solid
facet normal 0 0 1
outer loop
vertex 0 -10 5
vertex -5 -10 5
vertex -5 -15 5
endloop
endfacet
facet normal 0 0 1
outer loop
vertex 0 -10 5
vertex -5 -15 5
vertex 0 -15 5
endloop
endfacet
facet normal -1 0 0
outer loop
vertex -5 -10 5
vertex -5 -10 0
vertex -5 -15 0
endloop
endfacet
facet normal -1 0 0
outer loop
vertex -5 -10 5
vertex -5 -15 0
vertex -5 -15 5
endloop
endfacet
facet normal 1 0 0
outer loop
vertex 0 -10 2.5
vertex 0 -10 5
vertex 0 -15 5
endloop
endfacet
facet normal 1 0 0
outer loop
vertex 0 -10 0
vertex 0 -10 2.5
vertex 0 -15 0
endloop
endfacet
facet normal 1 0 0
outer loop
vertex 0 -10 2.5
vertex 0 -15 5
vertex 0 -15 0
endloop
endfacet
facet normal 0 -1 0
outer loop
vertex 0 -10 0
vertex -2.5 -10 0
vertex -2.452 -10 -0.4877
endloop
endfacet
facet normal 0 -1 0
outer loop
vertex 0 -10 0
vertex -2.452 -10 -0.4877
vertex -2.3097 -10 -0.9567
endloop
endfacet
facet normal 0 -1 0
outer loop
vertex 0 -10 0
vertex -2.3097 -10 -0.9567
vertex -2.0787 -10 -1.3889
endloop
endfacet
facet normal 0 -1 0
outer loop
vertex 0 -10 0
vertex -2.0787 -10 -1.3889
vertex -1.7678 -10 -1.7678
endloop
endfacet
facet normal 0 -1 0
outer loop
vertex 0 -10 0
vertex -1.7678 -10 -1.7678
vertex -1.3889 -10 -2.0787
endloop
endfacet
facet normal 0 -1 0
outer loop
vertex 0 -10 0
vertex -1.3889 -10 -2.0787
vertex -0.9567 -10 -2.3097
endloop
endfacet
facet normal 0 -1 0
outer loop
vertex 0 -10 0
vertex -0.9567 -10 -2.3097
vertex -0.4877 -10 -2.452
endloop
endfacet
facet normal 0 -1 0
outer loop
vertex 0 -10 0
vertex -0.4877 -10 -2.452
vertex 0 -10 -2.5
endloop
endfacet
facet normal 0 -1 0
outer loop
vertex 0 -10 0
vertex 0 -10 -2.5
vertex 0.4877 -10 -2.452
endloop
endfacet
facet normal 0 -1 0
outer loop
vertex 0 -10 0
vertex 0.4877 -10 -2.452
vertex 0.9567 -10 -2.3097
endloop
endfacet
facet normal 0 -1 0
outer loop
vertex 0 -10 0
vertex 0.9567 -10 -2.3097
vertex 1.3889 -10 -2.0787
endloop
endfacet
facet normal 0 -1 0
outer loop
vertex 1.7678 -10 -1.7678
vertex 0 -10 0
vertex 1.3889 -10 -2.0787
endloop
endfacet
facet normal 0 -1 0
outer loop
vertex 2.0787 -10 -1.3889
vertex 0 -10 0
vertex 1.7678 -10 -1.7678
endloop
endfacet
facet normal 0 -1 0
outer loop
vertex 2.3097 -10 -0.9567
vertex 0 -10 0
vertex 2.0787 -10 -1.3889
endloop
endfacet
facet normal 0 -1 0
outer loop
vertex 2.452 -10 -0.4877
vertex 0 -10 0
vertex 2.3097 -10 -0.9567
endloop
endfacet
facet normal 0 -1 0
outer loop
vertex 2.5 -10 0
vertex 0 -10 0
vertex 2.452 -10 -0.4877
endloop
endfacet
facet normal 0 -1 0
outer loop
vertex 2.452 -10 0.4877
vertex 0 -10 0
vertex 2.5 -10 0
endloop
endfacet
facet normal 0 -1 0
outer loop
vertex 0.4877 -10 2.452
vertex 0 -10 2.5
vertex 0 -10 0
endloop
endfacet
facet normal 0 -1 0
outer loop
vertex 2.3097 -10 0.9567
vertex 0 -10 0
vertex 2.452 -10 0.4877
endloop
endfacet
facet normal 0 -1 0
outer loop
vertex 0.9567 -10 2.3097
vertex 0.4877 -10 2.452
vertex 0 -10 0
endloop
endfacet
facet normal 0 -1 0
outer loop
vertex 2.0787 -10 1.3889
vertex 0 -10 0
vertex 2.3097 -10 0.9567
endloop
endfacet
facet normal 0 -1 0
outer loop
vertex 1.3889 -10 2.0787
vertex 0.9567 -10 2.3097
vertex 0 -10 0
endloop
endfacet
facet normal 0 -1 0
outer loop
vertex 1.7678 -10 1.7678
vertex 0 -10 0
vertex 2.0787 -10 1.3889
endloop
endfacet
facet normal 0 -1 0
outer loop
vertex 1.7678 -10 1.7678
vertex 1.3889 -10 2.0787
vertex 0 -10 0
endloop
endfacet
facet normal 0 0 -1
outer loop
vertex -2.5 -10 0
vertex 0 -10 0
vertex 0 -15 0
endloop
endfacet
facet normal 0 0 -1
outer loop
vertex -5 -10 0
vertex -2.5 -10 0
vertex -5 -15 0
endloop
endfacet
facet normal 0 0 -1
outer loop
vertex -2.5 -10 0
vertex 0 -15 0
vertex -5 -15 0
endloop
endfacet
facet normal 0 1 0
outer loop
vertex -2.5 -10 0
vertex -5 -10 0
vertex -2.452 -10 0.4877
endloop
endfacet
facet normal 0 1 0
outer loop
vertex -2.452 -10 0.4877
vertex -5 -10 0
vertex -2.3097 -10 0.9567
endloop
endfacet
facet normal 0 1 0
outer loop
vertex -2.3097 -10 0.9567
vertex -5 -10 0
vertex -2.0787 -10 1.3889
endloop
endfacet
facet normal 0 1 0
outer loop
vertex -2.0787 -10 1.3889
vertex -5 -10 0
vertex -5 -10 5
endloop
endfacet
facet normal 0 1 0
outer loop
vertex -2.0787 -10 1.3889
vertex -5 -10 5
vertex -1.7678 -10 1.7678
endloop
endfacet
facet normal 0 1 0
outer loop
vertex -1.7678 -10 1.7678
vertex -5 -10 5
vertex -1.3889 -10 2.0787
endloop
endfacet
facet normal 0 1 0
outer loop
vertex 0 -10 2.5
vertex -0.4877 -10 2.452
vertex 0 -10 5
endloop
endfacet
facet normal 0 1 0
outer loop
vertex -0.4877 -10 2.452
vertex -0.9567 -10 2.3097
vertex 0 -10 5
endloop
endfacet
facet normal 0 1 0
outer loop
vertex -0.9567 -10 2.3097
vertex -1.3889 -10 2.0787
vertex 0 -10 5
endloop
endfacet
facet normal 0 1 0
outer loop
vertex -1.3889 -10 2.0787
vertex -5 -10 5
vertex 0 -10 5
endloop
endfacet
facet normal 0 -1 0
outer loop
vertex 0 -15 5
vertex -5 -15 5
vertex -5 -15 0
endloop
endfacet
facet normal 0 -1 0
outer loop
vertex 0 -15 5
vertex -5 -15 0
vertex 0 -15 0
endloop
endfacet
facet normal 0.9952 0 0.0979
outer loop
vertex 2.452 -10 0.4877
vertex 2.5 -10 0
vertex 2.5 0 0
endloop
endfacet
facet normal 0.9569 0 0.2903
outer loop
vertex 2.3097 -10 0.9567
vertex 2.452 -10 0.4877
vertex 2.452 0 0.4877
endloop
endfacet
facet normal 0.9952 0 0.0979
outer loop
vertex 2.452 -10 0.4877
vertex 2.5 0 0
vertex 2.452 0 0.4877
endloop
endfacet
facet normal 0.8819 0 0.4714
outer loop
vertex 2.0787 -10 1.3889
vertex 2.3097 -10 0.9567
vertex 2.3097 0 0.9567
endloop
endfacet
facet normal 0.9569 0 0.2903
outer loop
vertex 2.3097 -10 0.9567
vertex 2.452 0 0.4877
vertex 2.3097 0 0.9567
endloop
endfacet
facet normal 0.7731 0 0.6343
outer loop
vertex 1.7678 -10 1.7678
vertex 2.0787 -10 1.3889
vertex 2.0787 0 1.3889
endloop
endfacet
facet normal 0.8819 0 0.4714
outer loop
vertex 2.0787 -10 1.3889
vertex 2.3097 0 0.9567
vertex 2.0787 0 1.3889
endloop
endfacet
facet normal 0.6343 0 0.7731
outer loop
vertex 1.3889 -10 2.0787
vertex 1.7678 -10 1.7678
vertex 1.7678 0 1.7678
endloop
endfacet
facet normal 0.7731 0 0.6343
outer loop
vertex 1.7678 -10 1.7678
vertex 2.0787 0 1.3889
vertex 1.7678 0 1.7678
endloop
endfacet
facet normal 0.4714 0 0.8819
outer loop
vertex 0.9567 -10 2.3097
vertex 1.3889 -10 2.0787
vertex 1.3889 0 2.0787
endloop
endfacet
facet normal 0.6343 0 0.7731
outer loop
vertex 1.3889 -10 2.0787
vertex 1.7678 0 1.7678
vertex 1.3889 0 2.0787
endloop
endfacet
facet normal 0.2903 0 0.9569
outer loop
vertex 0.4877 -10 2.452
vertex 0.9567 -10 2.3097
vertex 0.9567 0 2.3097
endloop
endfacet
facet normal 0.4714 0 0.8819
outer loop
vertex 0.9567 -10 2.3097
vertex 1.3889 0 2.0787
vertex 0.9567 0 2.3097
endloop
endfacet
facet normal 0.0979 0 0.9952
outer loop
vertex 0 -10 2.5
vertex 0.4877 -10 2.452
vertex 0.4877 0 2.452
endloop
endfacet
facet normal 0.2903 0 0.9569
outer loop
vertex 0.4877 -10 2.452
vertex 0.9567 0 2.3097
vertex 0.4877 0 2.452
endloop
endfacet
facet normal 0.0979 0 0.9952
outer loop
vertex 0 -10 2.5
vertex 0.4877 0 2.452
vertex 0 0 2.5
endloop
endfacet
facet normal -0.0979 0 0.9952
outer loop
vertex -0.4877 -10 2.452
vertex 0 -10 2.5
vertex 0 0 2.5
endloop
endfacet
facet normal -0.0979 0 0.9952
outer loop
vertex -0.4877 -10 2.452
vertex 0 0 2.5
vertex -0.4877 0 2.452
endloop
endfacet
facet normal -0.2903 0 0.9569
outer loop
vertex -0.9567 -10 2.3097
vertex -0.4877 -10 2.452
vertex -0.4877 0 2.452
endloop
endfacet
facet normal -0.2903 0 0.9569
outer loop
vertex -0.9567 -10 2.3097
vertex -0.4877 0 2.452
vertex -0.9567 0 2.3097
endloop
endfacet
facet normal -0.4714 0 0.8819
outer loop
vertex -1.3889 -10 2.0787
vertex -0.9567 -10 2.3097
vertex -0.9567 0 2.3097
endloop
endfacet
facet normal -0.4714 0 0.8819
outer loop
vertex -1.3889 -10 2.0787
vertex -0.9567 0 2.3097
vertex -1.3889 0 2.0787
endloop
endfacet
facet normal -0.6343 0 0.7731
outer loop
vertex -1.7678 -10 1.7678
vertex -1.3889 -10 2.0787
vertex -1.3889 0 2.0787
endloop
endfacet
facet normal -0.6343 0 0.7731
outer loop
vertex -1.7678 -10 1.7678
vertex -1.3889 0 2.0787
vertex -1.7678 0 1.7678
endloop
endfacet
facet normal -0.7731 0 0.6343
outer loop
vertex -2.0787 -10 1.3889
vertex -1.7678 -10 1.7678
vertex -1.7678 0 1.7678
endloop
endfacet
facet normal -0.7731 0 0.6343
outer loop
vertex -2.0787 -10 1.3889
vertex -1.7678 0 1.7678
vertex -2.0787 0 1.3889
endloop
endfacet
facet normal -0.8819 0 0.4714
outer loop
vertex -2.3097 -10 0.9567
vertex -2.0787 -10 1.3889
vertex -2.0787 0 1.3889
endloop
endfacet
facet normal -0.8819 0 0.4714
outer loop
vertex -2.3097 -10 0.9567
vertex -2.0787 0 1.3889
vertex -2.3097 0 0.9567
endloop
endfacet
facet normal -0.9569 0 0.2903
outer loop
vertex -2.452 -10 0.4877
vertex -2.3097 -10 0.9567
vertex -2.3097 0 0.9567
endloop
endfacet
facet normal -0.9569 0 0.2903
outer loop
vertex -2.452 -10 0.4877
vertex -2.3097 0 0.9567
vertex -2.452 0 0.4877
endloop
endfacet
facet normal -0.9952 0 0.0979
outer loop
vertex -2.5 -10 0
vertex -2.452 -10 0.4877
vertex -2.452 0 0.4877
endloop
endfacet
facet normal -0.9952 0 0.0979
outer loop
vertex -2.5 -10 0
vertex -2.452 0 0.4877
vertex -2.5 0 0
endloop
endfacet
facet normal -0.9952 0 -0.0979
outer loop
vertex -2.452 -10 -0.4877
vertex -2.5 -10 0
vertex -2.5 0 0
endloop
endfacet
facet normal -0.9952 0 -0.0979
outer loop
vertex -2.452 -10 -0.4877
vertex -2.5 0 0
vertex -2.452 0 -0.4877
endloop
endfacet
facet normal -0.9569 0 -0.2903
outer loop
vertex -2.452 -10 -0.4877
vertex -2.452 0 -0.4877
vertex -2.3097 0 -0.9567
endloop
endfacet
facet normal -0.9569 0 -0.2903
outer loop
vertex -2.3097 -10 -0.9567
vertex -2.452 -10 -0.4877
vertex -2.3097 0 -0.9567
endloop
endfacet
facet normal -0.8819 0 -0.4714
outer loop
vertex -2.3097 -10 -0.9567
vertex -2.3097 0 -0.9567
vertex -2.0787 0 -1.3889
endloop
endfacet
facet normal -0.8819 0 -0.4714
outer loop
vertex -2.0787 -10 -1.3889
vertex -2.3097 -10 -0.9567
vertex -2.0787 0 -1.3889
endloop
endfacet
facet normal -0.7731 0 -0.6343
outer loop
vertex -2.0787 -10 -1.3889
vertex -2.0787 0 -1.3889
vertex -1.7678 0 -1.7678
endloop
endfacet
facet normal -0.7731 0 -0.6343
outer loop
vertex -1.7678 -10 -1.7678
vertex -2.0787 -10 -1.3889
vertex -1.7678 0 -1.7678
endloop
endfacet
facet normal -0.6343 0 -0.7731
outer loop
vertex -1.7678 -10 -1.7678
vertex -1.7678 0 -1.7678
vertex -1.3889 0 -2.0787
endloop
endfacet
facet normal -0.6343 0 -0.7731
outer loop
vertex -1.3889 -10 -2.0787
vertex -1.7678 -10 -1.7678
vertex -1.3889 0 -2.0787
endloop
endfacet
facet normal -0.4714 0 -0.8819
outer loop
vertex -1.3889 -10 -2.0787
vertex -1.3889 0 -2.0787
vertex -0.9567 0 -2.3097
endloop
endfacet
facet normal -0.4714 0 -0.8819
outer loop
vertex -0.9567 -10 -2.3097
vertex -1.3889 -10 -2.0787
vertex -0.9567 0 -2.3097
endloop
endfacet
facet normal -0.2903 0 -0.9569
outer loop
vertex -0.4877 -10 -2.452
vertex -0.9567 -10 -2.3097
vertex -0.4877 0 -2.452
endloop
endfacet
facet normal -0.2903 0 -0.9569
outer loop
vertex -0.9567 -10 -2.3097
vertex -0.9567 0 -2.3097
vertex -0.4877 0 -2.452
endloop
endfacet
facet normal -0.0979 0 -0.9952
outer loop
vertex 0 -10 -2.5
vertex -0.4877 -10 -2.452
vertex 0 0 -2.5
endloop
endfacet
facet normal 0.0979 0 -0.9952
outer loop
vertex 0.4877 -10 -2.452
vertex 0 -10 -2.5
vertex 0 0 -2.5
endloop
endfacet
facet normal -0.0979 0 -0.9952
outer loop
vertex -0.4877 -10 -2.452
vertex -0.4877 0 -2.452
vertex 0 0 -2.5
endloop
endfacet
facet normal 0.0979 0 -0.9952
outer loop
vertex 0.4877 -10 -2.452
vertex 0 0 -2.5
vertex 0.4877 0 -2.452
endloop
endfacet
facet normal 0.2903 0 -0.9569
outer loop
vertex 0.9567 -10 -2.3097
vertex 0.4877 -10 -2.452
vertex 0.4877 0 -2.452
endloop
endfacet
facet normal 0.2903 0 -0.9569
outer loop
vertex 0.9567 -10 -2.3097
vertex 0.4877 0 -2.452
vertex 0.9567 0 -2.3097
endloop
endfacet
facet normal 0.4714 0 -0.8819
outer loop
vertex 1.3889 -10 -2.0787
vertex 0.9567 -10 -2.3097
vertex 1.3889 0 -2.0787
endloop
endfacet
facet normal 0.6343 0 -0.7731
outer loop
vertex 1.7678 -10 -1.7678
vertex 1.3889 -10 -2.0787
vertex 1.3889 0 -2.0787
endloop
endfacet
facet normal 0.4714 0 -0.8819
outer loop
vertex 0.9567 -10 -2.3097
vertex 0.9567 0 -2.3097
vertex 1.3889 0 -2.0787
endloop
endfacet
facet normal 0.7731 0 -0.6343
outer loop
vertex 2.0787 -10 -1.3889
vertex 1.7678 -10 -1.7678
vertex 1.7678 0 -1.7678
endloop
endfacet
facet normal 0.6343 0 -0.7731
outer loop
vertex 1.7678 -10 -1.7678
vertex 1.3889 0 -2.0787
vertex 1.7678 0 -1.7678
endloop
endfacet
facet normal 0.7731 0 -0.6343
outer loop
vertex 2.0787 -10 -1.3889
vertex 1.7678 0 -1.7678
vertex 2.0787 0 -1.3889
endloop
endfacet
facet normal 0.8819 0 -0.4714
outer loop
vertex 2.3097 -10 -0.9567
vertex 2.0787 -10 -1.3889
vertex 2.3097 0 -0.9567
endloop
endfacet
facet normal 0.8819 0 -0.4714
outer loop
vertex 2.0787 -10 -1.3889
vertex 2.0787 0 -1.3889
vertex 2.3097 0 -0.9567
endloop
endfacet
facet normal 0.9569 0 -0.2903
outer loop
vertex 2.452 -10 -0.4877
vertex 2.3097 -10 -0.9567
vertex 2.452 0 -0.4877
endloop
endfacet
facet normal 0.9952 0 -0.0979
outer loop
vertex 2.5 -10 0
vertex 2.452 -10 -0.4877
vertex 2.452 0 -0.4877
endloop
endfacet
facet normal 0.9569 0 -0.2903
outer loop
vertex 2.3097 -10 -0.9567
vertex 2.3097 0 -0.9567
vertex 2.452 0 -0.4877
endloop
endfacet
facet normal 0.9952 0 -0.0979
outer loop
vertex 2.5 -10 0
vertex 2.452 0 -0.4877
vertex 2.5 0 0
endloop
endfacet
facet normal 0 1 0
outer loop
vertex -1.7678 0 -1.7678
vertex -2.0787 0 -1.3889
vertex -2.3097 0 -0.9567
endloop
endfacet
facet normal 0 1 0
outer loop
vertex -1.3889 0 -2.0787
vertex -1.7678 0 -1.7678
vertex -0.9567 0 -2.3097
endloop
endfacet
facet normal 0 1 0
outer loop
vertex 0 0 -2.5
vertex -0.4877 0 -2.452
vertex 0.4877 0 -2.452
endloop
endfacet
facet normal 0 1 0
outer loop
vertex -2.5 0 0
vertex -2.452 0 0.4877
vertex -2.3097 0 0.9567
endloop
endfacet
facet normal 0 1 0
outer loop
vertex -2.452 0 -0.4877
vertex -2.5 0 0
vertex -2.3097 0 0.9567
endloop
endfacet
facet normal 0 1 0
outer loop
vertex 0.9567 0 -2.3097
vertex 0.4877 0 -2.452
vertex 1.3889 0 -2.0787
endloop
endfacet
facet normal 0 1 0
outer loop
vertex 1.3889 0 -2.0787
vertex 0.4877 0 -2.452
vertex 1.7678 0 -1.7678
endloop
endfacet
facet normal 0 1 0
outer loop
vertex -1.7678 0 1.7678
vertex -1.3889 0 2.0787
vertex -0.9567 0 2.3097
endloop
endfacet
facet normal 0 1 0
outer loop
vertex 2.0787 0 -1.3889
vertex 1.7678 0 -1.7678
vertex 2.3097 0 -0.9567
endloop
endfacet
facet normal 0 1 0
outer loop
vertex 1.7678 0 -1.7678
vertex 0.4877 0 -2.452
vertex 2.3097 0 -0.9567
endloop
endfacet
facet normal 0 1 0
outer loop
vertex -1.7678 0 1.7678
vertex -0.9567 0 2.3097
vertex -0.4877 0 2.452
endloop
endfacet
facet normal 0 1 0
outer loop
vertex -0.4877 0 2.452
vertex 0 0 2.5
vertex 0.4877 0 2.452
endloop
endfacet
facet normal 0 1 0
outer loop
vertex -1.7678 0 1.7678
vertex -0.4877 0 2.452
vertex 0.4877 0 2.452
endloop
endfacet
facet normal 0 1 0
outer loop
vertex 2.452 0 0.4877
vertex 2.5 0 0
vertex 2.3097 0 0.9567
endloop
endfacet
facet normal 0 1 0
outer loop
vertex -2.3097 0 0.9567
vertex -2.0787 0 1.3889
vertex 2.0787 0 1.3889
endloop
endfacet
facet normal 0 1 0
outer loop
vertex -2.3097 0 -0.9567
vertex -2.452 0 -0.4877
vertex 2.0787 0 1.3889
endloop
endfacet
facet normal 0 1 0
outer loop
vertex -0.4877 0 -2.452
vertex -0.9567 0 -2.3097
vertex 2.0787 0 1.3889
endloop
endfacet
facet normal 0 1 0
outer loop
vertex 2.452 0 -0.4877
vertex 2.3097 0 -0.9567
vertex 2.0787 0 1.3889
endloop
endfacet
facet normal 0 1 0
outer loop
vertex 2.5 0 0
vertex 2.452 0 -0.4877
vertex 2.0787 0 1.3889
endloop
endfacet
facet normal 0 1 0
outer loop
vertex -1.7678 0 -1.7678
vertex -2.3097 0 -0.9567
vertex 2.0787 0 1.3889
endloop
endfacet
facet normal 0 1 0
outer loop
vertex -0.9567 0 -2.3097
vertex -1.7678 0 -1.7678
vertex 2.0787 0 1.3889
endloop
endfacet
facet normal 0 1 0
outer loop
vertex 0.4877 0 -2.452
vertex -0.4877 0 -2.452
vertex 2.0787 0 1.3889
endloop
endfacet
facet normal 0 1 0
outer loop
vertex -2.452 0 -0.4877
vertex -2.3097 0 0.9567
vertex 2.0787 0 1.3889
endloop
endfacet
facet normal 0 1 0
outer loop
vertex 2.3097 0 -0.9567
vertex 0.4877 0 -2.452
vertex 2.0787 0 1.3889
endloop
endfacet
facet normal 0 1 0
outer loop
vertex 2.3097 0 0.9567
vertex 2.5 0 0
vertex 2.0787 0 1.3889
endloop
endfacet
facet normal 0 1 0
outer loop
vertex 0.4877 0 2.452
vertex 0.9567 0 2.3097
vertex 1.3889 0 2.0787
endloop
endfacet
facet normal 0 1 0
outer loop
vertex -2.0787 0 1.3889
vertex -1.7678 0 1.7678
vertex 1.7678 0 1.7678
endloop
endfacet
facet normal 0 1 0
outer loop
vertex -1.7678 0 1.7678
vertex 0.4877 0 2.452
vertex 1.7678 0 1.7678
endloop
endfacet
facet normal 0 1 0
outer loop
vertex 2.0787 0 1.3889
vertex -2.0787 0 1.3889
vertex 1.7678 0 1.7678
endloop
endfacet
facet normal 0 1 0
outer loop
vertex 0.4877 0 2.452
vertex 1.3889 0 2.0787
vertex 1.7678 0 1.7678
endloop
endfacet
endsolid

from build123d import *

# Parameters (mm, degrees)
F0_R     = 2.5
F1_DEPTH = 10
F2_W     = 10
F2_H     = 10
F3_DEPTH = 5
F5_DEPTH = 5


with BuildPart() as f1:
    # F0 (on Front) → F1 (new body)
    with BuildSketch(Plane.XZ):
        Circle(F0_R)
    extrude(amount=F1_DEPTH)

    # F2 (on face) → F3 (join)
    with BuildSketch(Plane.XZ.offset(10)):
        Rectangle(F2_W, F2_H)
    extrude(amount=F3_DEPTH)

    # F4 (on face) → F5 (cut, through all)
    with BuildSketch(Plane.XZ.offset(15)):
        Polygon((0, 5), (0, 0), (-5, 0), (-5, -5), (5, -5), (5, 0), (5, 5), align=None)
    extrude(amount=-F5_DEPTH, mode=Mode.SUBTRACT)


solid = f1.part
